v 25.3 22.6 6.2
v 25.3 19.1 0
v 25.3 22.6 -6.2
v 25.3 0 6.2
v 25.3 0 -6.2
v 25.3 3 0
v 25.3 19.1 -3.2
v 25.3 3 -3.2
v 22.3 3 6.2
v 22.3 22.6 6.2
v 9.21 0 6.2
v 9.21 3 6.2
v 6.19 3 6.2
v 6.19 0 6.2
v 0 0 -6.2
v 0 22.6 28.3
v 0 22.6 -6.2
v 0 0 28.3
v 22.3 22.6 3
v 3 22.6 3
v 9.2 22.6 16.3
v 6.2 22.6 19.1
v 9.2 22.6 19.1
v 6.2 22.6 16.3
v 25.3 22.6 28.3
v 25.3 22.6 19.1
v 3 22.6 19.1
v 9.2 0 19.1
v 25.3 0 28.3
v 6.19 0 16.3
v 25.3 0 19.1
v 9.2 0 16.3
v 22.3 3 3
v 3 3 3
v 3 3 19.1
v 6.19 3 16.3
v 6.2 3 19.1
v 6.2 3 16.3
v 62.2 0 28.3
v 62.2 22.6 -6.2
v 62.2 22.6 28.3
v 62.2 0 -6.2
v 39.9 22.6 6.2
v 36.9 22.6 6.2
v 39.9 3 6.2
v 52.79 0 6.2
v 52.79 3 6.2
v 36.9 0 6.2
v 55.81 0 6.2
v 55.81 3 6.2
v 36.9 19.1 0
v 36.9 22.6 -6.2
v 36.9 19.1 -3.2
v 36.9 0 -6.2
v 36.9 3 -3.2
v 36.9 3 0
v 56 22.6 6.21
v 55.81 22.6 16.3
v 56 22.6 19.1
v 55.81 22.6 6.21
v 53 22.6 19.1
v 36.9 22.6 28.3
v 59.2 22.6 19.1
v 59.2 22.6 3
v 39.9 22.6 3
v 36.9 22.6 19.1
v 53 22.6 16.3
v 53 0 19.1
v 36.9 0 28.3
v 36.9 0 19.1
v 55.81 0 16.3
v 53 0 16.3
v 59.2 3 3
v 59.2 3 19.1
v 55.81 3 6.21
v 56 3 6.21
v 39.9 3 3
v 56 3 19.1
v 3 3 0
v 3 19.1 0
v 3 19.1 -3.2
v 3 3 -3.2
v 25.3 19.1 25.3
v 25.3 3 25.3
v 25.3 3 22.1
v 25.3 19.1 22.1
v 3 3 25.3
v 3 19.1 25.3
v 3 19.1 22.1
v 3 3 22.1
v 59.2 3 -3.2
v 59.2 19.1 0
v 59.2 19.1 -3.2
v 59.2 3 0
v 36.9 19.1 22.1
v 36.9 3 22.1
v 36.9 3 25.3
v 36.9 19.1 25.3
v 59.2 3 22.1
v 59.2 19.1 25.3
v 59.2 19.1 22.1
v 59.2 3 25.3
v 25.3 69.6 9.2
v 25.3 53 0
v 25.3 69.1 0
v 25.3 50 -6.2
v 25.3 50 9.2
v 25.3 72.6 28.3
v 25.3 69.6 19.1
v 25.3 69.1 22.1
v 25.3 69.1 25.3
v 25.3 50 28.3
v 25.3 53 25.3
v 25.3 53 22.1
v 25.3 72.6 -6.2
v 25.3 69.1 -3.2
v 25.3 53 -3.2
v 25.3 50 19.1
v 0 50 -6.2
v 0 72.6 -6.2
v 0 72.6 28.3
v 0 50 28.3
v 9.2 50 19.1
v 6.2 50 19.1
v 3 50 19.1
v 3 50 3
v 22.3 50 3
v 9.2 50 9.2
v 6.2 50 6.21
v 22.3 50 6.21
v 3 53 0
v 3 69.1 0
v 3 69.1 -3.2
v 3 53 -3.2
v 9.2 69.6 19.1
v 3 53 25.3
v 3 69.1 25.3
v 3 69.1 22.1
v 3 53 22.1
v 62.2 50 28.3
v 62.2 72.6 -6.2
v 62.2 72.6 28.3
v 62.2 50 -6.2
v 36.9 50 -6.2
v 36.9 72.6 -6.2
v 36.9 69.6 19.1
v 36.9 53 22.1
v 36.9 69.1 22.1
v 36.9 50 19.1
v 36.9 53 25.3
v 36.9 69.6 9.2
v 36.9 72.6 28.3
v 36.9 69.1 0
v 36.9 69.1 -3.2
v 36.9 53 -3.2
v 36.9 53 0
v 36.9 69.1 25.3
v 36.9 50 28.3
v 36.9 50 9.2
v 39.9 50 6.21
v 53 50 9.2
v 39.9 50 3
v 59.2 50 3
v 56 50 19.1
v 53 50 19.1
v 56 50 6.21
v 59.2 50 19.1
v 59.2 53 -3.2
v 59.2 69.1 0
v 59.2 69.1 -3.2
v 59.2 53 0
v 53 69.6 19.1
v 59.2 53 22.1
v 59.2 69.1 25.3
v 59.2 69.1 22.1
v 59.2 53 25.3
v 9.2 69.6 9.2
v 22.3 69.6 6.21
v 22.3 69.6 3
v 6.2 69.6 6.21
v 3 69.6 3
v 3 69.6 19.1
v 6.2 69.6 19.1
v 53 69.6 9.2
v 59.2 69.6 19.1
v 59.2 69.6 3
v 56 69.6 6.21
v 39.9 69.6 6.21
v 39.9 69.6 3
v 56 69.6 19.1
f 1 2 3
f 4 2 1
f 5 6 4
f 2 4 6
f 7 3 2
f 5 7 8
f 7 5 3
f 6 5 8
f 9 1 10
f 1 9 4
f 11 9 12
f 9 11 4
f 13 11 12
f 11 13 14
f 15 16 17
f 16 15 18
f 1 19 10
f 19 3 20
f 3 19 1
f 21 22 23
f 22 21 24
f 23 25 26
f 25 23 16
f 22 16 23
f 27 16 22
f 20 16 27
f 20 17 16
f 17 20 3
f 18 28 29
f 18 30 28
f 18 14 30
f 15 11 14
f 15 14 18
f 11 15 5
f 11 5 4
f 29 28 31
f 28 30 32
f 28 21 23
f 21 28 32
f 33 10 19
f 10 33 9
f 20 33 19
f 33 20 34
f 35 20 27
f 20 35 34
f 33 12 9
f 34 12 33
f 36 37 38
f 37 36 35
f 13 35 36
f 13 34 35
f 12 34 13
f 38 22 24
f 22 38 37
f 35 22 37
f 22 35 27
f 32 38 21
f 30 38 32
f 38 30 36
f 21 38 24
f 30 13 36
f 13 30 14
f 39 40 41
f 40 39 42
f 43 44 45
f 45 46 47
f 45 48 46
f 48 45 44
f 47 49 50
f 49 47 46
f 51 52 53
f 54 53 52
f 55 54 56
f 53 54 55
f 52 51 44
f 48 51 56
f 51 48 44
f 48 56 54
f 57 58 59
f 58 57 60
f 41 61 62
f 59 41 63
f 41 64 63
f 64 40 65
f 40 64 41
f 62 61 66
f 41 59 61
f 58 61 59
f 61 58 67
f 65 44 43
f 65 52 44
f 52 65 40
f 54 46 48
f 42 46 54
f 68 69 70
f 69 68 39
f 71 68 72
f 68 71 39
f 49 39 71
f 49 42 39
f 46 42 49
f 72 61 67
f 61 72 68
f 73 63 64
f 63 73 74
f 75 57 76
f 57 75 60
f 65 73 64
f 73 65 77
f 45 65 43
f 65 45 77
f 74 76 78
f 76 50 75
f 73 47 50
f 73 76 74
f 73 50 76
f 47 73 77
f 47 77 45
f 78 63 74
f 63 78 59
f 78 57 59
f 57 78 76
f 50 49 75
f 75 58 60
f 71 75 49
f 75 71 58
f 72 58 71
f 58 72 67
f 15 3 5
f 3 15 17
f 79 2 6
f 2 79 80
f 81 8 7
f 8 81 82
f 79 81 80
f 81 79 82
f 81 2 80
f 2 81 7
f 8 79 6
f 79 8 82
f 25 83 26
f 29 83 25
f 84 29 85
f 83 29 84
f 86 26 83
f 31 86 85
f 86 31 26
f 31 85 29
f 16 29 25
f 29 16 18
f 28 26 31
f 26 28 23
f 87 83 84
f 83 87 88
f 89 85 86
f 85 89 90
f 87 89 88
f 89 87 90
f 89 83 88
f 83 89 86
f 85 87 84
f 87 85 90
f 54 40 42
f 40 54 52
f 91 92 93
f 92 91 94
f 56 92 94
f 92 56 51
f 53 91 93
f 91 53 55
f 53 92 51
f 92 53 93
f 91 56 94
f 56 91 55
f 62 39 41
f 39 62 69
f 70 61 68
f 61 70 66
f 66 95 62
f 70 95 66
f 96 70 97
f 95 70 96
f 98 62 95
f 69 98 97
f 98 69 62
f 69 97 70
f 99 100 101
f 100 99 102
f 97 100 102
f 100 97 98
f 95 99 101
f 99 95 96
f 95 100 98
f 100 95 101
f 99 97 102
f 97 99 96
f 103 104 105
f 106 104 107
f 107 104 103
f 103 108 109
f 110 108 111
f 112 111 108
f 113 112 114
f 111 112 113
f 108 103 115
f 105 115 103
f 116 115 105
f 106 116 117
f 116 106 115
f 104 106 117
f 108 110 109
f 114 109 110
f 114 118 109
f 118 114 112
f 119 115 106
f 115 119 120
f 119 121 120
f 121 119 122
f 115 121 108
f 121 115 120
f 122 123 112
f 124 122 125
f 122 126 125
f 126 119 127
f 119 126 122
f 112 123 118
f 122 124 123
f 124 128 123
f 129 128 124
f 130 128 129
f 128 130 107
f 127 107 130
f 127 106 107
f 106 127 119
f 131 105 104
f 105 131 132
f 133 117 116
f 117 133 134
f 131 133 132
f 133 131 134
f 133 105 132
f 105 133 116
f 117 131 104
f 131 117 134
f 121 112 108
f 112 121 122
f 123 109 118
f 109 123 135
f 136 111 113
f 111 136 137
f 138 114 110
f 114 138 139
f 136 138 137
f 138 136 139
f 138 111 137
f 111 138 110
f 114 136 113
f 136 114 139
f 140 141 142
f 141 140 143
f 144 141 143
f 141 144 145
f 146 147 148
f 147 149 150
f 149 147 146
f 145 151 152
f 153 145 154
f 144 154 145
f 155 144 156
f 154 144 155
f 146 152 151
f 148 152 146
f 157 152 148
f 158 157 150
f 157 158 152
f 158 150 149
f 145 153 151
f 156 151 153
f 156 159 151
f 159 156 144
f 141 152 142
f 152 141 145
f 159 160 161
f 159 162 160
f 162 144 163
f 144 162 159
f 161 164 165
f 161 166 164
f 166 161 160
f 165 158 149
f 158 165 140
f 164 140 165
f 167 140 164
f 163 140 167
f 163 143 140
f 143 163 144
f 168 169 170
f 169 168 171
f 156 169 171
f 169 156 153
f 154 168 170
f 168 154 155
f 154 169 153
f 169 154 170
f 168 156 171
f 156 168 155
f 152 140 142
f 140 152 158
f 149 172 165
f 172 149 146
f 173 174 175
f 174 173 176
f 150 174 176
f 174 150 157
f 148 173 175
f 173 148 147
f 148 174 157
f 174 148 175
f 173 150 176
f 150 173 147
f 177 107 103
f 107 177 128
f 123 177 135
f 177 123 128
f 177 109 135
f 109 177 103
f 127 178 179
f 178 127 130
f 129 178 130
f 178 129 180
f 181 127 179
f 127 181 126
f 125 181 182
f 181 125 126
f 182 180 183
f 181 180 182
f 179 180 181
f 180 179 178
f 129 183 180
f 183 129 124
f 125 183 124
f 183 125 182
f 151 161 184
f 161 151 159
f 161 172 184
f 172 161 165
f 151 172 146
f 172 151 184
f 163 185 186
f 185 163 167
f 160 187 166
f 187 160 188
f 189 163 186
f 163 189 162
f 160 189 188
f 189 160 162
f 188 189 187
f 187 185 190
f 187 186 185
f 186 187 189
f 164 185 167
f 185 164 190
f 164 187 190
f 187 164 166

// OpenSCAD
eps = 0.01;
z_tol = 0.5;

// wood piece parameters
wp_x = 16.1;
wp_y = 3.2;

// holder parameters
// wall thickness
wt = 3;
// cut depth
cd = wt+wp_x+wt+z_tol;
// hook hight
hh = 3;
// border width
//bw = 255;

// variable parameteres
// number of levels
nl = 1;

module end_holder(right=0)
{
    difference()
    {
        // main shape
        cube([wt+wp_x+wp_y+wt,cd,wt+wp_y+wt]);
        
        // cut for the wood piece
        translate(right==1 ? [-eps,wt,wt] : [wt,wt,wt])
            cube([wp_x+wp_y+wt+eps,wp_x,wp_y]);
    }
}

module front_level(right=0)
{
    difference()
    {
        union()
        {
            // horizontal block
            cube([wt+wp_x+wp_y+wt, cd, wt+wp_y]);
            // vertical block
            translate(right==1 ? [wp_x,0,0] : [0,0,0])
                cube([wt+wp_y+wt, cd, wt+wp_x+wt]);
        }
        
        // horizontal wooden piece cut
        translate([wt,wt,wt])
            cube([wp_x+wp_y,cd+eps,wp_y+eps]);
        
        // vertical wooden piece cut
        translate(right==1 ? [wt+wp_x,wt,wt] : [wt,wt,wt])
            cube([wp_y,cd+eps,wp_x]);
        
        // hook cut
        translate(  right==1 ?
                    [wt+wp_x-wp_y-eps,-eps,wt+wp_y] : 
                    [wt+wp_y-eps,-eps,wt+wp_y])
            cube([wt+2*eps,cd+2*eps,wp_x-hh-wt]);
    }
}

module front_piece()
{   
    
    _z = wt+wp_x+wt;
    
    // borders
    for(i=[0:nl-1])
    {
        translate([0,0,i*_z])
            front_level();
        translate([50-wp_x+wt,0,i*_z])
            front_level(right=1);
    }
    
    translate([0,0,-wt-wp_y])
        end_holder();
    
    translate([0,0,nl*_z-wt])
        end_holder();
    
    translate([50+wt-wp_x,0,-wt-wp_y])
        end_holder(right=1);
    
    translate([50+wt-wp_x,0,nl*_z-wt])
        end_holder(right=1);
    
}

front_piece();

module back_level(right=0)
{
    difference()
    {
        union()
        {
            cube([wt+wp_x+wp_y+wt, cd, wt+wp_y+wt]);
            translate(right==1 ? [wp_x,0,0] : [0,0,0])
                cube([wt+wp_y+wt, cd, wt+wp_x+wt]);
            translate([0,cd-wt,0])
                cube([wt+wp_x+wp_y+wt, wt, wt+wp_x+wt]);
        }
        
        // horizontal wooden piece cut
        translate([wt,-eps,wt])
            cube([wp_x+wp_y,cd-wt+eps,wp_y+eps]);
        
        // vertical wooden piece cut
        translate(right== 1 ? [wt+wp_x,-eps,wt] : [wt,-eps,wt])
            cube([wp_y,cd-wt+eps,wp_x]);
    }
}

//translate([50,0,0])
//    back_level(right=1);

module back_piece()
{   
    
    _z = wt+wp_x+wt;
    
    // borders
    for(i=[0:nl-1])
    {
        translate([0,0,i*_z])
            back_level(right=0);
        translate([50-wp_x+wt,0,i*_z])
            back_level(right=1);
    }
    
    translate([0,0,-wt-wp_y])
        end_holder();
    
    translate([0,0,nl*_z-wt])
        end_holder();
    
    translate([50+wt-wp_x,0,-wt-wp_y])
        end_holder(right=1);
    
    translate([50+wt-wp_x,0,nl*_z-wt])
        end_holder(right=1);
    
}
translate([0,50,0])
    back_piece();
